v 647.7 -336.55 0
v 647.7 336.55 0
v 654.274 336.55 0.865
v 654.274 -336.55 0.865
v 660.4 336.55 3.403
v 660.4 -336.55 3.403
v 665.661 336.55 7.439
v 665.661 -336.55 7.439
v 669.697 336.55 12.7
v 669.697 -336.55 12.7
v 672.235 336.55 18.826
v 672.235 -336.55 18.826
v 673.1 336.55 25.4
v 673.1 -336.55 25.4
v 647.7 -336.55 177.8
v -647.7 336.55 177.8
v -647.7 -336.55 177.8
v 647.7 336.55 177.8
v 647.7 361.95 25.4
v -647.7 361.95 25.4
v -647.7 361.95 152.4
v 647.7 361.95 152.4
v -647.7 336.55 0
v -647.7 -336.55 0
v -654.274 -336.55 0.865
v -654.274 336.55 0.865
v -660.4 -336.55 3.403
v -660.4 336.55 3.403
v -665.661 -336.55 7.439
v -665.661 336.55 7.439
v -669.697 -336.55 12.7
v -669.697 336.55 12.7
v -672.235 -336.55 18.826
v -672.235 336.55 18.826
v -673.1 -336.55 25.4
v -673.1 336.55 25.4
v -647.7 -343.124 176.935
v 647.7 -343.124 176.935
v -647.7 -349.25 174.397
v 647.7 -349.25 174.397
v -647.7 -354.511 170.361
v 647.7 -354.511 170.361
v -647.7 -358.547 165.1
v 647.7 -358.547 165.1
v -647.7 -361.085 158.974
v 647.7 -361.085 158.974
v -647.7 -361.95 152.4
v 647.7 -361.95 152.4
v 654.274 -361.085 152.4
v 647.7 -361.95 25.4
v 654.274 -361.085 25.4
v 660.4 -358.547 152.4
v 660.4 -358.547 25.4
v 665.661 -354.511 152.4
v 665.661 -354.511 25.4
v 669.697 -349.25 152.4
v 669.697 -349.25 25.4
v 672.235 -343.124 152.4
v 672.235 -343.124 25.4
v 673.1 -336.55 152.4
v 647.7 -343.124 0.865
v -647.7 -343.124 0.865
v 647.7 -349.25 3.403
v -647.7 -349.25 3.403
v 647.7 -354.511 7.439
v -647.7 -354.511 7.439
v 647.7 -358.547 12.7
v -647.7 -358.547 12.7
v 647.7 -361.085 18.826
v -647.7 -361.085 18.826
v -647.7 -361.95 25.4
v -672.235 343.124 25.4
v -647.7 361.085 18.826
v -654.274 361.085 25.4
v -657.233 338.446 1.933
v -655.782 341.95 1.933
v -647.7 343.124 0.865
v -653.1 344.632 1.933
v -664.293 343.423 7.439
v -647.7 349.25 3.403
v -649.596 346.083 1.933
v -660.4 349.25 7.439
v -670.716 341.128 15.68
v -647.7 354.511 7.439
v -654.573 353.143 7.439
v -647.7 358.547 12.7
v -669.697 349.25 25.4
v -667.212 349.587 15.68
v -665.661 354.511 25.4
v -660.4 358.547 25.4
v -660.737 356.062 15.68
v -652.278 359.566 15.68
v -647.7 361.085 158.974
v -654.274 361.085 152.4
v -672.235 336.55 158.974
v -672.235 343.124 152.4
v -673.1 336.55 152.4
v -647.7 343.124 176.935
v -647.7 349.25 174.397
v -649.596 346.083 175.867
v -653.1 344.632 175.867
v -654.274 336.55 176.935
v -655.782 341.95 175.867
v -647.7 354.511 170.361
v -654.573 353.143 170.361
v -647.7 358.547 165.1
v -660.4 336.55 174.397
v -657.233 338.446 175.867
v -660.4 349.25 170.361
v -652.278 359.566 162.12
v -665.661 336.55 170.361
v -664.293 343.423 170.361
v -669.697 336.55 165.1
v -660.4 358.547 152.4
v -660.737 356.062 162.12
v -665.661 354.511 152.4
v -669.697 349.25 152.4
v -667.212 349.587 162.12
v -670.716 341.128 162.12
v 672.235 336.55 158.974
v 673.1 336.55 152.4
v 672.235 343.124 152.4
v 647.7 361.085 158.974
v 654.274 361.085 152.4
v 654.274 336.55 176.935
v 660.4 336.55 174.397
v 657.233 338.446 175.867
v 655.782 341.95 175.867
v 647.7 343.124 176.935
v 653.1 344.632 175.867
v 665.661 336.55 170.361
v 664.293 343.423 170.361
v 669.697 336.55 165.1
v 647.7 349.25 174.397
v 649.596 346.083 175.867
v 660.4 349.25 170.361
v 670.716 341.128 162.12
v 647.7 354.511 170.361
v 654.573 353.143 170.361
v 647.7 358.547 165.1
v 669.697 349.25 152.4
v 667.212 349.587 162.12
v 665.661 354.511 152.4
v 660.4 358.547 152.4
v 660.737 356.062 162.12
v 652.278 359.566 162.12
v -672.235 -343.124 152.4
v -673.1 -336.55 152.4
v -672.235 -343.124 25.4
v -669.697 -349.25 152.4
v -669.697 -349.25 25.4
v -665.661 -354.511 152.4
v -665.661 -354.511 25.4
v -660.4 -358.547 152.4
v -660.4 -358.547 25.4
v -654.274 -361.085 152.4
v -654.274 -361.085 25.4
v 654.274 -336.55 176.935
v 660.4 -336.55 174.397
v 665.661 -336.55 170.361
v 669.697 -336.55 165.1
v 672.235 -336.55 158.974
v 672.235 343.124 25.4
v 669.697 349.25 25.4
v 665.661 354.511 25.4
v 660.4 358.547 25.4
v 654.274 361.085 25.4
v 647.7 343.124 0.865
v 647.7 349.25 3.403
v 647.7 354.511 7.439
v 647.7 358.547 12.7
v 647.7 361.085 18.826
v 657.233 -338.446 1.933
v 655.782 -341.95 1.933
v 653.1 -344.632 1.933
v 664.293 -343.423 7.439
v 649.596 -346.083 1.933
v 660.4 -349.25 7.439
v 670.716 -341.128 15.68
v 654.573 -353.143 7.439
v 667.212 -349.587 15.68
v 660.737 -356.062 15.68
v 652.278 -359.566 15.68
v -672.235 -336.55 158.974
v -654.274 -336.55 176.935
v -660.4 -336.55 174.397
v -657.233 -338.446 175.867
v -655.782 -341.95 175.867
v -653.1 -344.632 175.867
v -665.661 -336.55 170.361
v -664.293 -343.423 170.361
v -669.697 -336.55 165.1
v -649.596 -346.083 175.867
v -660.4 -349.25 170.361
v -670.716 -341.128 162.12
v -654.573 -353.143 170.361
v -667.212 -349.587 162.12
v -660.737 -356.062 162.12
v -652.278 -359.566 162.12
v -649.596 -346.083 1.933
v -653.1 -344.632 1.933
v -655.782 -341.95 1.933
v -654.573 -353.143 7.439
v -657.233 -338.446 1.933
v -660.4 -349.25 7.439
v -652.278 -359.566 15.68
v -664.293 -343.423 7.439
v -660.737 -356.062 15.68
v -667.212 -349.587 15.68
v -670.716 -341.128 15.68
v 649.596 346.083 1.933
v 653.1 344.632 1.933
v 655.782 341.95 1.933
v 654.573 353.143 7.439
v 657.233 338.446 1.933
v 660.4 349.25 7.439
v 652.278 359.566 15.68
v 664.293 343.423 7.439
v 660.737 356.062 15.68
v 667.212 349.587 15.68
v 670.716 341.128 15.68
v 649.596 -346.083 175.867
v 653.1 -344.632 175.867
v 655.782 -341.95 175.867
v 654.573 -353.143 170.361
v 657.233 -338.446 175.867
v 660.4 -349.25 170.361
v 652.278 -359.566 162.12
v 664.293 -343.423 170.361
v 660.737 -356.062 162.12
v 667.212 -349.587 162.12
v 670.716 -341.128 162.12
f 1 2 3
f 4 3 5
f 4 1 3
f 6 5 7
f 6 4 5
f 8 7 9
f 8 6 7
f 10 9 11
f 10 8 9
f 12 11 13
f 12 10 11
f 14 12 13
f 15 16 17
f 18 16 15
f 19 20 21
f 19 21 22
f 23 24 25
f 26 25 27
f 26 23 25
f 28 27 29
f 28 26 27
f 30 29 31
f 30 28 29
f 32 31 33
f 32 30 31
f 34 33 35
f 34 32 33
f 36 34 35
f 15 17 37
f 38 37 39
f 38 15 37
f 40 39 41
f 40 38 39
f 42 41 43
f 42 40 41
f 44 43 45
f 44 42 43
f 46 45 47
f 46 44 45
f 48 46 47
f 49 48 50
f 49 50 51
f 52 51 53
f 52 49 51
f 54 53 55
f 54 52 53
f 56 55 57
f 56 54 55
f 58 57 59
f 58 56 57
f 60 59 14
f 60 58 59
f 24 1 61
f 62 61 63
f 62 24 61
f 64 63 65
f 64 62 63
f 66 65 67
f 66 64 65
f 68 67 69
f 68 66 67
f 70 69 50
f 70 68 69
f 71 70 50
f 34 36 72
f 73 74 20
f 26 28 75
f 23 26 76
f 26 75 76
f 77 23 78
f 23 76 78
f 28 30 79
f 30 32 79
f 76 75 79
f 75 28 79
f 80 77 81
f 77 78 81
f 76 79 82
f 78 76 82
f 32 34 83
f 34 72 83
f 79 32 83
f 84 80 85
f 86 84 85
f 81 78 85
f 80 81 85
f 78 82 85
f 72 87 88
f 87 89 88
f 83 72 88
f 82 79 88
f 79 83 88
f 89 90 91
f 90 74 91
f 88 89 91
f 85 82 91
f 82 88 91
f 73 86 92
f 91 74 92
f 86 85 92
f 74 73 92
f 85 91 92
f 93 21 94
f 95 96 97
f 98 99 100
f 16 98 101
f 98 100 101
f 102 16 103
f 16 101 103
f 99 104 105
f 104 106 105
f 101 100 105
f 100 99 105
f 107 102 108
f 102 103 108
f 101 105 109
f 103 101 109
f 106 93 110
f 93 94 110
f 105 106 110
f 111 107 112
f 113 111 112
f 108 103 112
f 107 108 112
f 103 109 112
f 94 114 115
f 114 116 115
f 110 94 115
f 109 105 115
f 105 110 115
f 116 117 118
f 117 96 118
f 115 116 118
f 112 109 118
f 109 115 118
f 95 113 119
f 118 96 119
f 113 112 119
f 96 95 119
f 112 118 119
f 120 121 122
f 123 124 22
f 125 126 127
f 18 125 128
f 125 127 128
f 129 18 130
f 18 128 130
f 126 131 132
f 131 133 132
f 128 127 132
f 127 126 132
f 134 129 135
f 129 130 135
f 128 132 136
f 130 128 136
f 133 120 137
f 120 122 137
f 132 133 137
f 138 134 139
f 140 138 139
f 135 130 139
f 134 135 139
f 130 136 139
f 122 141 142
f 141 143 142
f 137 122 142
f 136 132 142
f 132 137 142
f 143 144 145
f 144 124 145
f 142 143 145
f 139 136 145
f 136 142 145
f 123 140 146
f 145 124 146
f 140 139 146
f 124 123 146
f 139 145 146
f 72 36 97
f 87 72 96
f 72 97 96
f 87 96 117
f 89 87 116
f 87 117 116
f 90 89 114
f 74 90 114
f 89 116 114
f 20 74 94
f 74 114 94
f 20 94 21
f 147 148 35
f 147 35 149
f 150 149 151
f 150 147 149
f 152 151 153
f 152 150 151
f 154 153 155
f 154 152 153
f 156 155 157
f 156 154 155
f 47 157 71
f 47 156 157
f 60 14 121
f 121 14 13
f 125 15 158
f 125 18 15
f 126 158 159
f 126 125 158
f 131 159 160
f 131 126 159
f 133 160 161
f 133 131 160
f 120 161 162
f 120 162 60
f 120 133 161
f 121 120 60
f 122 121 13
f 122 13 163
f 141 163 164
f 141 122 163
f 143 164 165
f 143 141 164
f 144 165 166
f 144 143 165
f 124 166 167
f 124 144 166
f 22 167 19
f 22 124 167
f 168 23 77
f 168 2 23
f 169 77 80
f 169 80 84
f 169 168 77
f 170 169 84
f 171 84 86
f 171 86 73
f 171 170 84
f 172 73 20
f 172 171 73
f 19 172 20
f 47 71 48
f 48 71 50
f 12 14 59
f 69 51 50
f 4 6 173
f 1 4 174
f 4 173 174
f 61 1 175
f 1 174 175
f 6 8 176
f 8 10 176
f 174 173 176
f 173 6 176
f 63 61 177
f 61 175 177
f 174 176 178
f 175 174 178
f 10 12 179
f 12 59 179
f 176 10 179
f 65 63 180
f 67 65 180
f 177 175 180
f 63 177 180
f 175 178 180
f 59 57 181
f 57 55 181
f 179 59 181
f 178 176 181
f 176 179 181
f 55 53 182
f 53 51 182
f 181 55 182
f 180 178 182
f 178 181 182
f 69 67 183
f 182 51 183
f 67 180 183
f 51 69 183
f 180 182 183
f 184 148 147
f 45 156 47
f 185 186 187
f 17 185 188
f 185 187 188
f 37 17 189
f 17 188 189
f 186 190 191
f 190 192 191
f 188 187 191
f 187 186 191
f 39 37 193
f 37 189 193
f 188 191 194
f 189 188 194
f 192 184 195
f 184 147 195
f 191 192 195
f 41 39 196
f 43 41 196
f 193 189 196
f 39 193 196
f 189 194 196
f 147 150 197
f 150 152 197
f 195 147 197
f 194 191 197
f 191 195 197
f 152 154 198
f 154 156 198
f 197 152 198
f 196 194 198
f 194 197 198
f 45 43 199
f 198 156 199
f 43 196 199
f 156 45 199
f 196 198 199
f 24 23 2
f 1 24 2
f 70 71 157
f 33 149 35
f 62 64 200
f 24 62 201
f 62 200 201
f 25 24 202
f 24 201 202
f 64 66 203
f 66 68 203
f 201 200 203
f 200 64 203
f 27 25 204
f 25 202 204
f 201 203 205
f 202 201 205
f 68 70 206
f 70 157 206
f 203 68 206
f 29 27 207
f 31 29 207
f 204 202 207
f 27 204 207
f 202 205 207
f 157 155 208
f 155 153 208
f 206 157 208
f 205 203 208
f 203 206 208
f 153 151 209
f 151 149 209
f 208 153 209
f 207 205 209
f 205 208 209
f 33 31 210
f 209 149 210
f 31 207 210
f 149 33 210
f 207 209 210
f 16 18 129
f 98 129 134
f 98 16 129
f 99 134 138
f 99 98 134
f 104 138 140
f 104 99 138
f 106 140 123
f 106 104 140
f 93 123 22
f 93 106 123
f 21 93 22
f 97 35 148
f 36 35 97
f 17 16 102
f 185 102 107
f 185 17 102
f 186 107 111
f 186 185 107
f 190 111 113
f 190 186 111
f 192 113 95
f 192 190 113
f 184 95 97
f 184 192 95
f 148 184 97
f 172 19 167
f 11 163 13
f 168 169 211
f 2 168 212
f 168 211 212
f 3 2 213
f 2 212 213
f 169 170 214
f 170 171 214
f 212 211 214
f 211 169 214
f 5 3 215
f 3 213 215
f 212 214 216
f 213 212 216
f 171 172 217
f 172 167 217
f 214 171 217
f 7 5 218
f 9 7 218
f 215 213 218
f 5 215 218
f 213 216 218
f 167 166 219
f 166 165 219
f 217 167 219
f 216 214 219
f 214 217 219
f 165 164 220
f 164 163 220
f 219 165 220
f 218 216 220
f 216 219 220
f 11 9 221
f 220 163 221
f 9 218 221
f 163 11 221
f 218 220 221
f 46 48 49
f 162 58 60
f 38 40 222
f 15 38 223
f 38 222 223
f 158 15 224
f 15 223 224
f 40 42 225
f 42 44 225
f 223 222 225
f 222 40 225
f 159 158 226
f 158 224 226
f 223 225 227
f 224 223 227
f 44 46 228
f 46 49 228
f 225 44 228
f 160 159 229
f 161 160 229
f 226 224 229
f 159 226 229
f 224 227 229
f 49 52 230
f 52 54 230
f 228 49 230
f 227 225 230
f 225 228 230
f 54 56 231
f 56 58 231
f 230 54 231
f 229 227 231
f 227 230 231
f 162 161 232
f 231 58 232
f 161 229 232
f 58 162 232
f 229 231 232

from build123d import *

# Parameters (mm, degrees)
SKETCH_W    = 1346.2
SKETCH_H    = 723.9
PAD_DEPTH   = 177.8
FILLET_R    = 25.4
FILLET001_R = 25.4


with BuildPart() as part:
    # Sketch → Pad (new body)
    with BuildSketch(Plane.XY):
        Rectangle(SKETCH_W, SKETCH_H)
    extrude(amount=PAD_DEPTH)

    # Fillet
    fillet_edges = [part.edges().sort_by_distance(p)[0] for p in [
        (673.1, -361.95, 88.9),
        (-673.1, -361.95, 88.9),
        (673.1, 361.95, 88.9),
        (-673.1, 361.95, 88.9),
    ]]
    fillet(fillet_edges, radius=FILLET_R)

    # Fillet001
    fillet001_edges = [part.edges().sort_by_distance(p)[0] for p in [
        (0, 361.95, 0),
        (673.1, 0, 0),
        (0, -361.95, 0),
        (-673.1, 0, 0),
        (673.1, 0, 177.8),
        (0, -361.95, 177.8),
        (0, 361.95, 177.8),
        (-673.1, 0, 177.8),
    ]]
    fillet(fillet001_edges, radius=FILLET001_R)


solid = part.part
